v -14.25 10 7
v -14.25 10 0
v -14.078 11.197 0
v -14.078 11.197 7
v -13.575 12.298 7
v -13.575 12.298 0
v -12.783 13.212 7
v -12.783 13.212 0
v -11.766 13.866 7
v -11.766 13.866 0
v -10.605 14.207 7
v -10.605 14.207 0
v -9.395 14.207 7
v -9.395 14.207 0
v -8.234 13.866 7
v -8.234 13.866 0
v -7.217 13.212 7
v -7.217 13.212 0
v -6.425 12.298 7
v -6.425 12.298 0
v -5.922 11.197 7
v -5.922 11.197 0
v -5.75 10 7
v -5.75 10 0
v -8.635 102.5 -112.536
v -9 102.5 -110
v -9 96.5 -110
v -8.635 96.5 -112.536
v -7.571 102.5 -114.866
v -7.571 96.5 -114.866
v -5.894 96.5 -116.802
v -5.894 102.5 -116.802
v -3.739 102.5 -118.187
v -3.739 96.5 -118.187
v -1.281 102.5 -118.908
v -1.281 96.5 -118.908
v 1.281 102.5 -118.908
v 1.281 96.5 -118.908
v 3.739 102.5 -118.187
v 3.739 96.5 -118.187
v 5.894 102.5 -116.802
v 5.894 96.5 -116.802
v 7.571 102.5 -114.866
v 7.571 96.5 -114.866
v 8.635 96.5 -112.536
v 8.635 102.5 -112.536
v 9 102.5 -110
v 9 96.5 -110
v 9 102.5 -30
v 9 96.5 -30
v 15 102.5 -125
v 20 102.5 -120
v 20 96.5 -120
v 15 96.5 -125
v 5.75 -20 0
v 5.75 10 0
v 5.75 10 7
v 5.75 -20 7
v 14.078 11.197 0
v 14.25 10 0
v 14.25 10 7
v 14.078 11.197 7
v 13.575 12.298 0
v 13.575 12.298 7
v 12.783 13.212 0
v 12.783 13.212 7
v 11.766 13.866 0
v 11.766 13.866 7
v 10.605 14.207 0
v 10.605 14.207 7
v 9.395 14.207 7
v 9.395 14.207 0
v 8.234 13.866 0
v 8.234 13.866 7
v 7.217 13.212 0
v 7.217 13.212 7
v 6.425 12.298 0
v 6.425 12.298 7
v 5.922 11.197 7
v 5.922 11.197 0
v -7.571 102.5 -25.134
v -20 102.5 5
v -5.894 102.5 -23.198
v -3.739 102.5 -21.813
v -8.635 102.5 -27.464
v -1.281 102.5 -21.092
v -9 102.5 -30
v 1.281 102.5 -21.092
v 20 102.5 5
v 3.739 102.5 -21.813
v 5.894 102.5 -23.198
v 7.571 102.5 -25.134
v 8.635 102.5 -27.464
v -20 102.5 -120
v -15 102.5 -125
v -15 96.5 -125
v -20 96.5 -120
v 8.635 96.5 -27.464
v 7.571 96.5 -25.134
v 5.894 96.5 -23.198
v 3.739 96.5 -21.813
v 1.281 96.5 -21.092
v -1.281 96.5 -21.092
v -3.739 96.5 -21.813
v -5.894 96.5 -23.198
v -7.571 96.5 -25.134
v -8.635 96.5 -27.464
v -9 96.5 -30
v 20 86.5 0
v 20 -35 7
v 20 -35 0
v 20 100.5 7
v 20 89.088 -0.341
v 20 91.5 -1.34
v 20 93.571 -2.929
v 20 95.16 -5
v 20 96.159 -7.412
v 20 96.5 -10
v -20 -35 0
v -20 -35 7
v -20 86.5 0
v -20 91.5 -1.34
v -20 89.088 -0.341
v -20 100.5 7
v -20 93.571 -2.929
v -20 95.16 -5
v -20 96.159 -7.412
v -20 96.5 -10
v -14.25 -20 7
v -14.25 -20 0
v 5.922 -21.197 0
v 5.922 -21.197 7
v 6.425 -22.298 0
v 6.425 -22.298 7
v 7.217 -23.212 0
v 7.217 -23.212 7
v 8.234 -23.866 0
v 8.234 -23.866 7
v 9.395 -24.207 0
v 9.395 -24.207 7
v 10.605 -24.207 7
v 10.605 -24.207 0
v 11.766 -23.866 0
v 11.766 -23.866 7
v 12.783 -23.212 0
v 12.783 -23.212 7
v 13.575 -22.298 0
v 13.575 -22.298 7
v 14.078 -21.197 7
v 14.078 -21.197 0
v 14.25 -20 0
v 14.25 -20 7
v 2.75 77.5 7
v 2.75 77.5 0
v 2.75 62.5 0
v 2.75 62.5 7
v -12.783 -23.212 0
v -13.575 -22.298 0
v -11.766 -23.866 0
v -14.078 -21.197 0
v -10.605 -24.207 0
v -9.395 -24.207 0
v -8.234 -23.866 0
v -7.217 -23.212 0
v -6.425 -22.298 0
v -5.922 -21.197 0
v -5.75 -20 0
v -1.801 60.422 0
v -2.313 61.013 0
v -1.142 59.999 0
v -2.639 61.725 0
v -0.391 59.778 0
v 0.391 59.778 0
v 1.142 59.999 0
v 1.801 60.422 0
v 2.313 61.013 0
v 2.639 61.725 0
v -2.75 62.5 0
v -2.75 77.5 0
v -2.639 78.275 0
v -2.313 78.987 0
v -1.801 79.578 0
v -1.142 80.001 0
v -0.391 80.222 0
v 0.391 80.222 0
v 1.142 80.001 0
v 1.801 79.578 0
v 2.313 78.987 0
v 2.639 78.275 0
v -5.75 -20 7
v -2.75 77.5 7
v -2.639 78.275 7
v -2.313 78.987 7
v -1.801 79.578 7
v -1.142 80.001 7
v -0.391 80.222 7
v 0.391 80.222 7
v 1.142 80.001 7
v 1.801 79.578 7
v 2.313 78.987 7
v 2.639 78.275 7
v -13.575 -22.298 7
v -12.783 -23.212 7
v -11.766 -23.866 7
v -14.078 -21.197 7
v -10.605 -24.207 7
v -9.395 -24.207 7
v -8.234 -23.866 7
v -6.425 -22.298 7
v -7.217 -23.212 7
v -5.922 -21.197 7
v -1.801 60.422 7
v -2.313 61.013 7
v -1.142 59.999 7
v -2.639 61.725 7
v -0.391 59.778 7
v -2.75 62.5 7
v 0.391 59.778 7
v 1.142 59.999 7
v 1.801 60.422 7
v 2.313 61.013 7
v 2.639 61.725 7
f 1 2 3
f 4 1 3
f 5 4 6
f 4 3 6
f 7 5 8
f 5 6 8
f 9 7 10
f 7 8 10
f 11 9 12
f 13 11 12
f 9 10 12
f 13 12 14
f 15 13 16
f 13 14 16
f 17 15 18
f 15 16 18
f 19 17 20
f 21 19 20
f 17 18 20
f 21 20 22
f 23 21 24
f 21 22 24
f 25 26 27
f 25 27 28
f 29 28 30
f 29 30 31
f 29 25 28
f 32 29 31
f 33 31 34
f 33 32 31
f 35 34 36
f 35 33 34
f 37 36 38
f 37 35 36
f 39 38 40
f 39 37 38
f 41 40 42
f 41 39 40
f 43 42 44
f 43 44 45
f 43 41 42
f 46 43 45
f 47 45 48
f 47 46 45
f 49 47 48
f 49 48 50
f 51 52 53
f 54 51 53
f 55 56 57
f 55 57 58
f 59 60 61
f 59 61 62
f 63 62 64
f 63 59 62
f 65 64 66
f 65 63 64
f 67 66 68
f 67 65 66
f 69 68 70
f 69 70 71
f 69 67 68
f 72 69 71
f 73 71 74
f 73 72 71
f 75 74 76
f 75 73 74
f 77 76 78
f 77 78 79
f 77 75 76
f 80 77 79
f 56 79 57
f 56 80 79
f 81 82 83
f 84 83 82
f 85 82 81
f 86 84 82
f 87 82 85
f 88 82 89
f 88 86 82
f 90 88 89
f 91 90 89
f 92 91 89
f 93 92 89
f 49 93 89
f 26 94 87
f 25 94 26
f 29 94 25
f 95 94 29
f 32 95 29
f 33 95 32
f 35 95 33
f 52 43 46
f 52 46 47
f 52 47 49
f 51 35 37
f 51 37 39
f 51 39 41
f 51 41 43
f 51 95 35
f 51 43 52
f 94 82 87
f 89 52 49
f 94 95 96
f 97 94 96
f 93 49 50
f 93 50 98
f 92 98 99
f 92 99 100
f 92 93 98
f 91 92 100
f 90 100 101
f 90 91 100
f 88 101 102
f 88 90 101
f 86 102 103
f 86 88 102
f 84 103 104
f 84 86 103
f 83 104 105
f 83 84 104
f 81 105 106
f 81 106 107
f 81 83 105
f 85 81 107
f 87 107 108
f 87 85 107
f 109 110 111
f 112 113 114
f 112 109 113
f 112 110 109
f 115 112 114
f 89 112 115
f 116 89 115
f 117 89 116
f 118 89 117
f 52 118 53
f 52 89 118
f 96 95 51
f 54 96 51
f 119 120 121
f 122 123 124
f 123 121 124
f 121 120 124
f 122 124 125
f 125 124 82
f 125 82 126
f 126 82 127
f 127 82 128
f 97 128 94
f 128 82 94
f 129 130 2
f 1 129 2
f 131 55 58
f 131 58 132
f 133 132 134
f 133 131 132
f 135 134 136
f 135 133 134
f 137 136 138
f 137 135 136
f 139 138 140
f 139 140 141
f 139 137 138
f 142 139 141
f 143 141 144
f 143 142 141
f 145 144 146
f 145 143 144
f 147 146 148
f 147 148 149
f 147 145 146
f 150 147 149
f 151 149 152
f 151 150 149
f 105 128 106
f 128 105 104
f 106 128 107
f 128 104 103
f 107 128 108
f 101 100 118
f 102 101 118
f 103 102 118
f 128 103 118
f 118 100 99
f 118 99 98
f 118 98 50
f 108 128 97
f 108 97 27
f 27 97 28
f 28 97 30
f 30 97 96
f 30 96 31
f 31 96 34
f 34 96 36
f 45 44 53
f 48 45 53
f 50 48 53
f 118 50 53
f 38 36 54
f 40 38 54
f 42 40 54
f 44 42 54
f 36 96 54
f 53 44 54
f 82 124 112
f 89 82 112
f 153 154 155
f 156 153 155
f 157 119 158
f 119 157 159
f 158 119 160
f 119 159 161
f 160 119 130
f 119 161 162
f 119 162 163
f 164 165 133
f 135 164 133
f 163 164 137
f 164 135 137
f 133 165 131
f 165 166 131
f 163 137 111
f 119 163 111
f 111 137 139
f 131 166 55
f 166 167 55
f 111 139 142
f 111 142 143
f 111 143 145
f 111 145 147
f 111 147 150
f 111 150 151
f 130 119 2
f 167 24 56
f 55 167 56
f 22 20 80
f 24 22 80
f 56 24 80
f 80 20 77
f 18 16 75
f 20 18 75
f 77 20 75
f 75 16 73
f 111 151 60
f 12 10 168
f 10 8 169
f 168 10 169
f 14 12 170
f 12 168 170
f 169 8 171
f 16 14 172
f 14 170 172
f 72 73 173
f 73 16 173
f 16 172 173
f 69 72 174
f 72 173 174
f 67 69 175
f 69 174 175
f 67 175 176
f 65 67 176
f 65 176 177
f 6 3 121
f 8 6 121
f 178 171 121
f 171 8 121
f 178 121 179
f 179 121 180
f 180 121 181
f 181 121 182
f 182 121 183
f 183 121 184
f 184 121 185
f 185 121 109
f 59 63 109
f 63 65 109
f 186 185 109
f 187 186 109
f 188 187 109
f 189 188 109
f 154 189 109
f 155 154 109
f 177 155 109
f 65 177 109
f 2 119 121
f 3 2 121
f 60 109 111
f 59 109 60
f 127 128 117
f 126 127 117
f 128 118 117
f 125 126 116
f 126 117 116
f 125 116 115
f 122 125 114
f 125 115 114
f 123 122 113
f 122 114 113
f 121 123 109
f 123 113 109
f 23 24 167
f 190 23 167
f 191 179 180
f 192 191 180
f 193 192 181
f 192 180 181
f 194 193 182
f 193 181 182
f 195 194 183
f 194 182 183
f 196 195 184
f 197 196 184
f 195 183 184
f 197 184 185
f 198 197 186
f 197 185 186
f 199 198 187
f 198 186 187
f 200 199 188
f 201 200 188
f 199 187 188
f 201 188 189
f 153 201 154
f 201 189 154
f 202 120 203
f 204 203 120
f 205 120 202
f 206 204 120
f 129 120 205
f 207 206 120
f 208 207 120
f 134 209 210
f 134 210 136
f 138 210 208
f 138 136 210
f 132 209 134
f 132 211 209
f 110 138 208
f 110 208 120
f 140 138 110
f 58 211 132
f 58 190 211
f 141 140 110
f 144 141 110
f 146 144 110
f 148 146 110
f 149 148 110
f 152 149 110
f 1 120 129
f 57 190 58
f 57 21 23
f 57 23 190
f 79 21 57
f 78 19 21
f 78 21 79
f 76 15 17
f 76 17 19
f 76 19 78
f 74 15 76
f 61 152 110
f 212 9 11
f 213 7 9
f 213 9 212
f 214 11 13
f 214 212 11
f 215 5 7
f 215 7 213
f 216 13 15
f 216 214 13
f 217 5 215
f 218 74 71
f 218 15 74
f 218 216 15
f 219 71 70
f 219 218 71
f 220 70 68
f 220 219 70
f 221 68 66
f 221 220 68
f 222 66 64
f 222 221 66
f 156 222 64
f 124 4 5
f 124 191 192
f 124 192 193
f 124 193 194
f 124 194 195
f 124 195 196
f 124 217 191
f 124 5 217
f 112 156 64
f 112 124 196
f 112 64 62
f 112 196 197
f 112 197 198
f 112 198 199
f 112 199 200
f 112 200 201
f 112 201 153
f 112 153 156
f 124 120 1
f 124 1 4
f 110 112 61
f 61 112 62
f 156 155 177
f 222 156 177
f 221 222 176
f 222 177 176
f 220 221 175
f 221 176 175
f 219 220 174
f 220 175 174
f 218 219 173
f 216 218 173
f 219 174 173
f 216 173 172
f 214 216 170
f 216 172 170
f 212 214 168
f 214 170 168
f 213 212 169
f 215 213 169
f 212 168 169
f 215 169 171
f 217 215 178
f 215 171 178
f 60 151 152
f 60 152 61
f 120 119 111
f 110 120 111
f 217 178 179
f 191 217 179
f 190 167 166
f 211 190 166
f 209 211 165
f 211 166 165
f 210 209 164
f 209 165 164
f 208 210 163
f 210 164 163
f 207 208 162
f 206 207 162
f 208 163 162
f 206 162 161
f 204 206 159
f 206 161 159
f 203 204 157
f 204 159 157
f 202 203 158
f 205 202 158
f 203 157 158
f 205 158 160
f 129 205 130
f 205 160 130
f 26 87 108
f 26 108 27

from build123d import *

# Parameters (mm, degrees)
SKETCH2_W           = 40
SKETCH2_H           = 137.5
BOSS_EXTRUDE1_DEPTH = 7
SKETCH4_W           = 40
SKETCH4_H           = 125
BOSS_EXTRUDE2_DEPTH = 6
FILLET1_R           = 10
CHAMFER1_SIZE       = 5
CHAMFER2_SIZE       = 2


with BuildPart() as part:
    # Sketch2 → Boss-Extrude1 (new body)
    with BuildSketch(Plane.XY):
        with Locations((0, 33.75)):
            Rectangle(SKETCH2_W, SKETCH2_H)
        with BuildLine():
            Line((-5.75, 10), (-5.75, -20))
            ThreePointArc((-5.75, -20), (-10, -24.25), (-14.25, -20))
            Line((-14.25, -20), (-14.25, 10))
            ThreePointArc((-14.25, 10), (-10, 14.25), (-5.75, 10))
        make_face(mode=Mode.SUBTRACT)
        with BuildLine():
            Line((5.75, 10), (5.75, -20))
            ThreePointArc((5.75, -20), (10, -24.25), (14.25, -20))
            Line((14.25, -20), (14.25, 10))
            ThreePointArc((14.25, 10), (10, 14.25), (5.75, 10))
        make_face(mode=Mode.SUBTRACT)
        with BuildLine():
            Line((2.75, 77.5), (2.75, 62.5))
            ThreePointArc((2.75, 62.5), (0, 59.75), (-2.75, 62.5))
            Line((-2.75, 62.5), (-2.75, 77.5))
            ThreePointArc((-2.75, 77.5), (0, 80.25), (2.75, 77.5))
        make_face(mode=Mode.SUBTRACT)
    extrude(amount=BOSS_EXTRUDE1_DEPTH)

    # Sketch4 → Boss-Extrude2 (add)
    with BuildSketch(Plane(origin=(0, 102.5, 0), x_dir=(1, 0, 0), z_dir=(0, 1, 0))):
        with Locations((0, 62.5)):
            Rectangle(SKETCH4_W, SKETCH4_H)
        with BuildLine():
            Line((-9, 30), (-9, 110))
            ThreePointArc((-9, 110), (0, 119), (9, 110))
            Line((9, 110), (9, 30))
            ThreePointArc((9, 30), (0, 21), (-9, 30))
        make_face(mode=Mode.SUBTRACT)
    extrude(amount=-BOSS_EXTRUDE2_DEPTH)

    # Fillet1
    fillet1_edges = [part.edges().sort_by_distance(p)[0] for p in [
        (0, 96.5, 0),
    ]]
    fillet(fillet1_edges, radius=FILLET1_R)

    # Chamfer1
    chamfer1_edges = [part.edges().sort_by_distance(p)[0] for p in [
        (-20, 99.5, -125),
        (20, 99.5, -125),
    ]]
    chamfer(chamfer1_edges, length=CHAMFER1_SIZE)

    # Chamfer2
    chamfer2_edges = [part.edges().sort_by_distance(p)[0] for p in [
        (0, 102.5, 7),
    ]]
    chamfer(chamfer2_edges, length=CHAMFER2_SIZE)


solid = part.part
